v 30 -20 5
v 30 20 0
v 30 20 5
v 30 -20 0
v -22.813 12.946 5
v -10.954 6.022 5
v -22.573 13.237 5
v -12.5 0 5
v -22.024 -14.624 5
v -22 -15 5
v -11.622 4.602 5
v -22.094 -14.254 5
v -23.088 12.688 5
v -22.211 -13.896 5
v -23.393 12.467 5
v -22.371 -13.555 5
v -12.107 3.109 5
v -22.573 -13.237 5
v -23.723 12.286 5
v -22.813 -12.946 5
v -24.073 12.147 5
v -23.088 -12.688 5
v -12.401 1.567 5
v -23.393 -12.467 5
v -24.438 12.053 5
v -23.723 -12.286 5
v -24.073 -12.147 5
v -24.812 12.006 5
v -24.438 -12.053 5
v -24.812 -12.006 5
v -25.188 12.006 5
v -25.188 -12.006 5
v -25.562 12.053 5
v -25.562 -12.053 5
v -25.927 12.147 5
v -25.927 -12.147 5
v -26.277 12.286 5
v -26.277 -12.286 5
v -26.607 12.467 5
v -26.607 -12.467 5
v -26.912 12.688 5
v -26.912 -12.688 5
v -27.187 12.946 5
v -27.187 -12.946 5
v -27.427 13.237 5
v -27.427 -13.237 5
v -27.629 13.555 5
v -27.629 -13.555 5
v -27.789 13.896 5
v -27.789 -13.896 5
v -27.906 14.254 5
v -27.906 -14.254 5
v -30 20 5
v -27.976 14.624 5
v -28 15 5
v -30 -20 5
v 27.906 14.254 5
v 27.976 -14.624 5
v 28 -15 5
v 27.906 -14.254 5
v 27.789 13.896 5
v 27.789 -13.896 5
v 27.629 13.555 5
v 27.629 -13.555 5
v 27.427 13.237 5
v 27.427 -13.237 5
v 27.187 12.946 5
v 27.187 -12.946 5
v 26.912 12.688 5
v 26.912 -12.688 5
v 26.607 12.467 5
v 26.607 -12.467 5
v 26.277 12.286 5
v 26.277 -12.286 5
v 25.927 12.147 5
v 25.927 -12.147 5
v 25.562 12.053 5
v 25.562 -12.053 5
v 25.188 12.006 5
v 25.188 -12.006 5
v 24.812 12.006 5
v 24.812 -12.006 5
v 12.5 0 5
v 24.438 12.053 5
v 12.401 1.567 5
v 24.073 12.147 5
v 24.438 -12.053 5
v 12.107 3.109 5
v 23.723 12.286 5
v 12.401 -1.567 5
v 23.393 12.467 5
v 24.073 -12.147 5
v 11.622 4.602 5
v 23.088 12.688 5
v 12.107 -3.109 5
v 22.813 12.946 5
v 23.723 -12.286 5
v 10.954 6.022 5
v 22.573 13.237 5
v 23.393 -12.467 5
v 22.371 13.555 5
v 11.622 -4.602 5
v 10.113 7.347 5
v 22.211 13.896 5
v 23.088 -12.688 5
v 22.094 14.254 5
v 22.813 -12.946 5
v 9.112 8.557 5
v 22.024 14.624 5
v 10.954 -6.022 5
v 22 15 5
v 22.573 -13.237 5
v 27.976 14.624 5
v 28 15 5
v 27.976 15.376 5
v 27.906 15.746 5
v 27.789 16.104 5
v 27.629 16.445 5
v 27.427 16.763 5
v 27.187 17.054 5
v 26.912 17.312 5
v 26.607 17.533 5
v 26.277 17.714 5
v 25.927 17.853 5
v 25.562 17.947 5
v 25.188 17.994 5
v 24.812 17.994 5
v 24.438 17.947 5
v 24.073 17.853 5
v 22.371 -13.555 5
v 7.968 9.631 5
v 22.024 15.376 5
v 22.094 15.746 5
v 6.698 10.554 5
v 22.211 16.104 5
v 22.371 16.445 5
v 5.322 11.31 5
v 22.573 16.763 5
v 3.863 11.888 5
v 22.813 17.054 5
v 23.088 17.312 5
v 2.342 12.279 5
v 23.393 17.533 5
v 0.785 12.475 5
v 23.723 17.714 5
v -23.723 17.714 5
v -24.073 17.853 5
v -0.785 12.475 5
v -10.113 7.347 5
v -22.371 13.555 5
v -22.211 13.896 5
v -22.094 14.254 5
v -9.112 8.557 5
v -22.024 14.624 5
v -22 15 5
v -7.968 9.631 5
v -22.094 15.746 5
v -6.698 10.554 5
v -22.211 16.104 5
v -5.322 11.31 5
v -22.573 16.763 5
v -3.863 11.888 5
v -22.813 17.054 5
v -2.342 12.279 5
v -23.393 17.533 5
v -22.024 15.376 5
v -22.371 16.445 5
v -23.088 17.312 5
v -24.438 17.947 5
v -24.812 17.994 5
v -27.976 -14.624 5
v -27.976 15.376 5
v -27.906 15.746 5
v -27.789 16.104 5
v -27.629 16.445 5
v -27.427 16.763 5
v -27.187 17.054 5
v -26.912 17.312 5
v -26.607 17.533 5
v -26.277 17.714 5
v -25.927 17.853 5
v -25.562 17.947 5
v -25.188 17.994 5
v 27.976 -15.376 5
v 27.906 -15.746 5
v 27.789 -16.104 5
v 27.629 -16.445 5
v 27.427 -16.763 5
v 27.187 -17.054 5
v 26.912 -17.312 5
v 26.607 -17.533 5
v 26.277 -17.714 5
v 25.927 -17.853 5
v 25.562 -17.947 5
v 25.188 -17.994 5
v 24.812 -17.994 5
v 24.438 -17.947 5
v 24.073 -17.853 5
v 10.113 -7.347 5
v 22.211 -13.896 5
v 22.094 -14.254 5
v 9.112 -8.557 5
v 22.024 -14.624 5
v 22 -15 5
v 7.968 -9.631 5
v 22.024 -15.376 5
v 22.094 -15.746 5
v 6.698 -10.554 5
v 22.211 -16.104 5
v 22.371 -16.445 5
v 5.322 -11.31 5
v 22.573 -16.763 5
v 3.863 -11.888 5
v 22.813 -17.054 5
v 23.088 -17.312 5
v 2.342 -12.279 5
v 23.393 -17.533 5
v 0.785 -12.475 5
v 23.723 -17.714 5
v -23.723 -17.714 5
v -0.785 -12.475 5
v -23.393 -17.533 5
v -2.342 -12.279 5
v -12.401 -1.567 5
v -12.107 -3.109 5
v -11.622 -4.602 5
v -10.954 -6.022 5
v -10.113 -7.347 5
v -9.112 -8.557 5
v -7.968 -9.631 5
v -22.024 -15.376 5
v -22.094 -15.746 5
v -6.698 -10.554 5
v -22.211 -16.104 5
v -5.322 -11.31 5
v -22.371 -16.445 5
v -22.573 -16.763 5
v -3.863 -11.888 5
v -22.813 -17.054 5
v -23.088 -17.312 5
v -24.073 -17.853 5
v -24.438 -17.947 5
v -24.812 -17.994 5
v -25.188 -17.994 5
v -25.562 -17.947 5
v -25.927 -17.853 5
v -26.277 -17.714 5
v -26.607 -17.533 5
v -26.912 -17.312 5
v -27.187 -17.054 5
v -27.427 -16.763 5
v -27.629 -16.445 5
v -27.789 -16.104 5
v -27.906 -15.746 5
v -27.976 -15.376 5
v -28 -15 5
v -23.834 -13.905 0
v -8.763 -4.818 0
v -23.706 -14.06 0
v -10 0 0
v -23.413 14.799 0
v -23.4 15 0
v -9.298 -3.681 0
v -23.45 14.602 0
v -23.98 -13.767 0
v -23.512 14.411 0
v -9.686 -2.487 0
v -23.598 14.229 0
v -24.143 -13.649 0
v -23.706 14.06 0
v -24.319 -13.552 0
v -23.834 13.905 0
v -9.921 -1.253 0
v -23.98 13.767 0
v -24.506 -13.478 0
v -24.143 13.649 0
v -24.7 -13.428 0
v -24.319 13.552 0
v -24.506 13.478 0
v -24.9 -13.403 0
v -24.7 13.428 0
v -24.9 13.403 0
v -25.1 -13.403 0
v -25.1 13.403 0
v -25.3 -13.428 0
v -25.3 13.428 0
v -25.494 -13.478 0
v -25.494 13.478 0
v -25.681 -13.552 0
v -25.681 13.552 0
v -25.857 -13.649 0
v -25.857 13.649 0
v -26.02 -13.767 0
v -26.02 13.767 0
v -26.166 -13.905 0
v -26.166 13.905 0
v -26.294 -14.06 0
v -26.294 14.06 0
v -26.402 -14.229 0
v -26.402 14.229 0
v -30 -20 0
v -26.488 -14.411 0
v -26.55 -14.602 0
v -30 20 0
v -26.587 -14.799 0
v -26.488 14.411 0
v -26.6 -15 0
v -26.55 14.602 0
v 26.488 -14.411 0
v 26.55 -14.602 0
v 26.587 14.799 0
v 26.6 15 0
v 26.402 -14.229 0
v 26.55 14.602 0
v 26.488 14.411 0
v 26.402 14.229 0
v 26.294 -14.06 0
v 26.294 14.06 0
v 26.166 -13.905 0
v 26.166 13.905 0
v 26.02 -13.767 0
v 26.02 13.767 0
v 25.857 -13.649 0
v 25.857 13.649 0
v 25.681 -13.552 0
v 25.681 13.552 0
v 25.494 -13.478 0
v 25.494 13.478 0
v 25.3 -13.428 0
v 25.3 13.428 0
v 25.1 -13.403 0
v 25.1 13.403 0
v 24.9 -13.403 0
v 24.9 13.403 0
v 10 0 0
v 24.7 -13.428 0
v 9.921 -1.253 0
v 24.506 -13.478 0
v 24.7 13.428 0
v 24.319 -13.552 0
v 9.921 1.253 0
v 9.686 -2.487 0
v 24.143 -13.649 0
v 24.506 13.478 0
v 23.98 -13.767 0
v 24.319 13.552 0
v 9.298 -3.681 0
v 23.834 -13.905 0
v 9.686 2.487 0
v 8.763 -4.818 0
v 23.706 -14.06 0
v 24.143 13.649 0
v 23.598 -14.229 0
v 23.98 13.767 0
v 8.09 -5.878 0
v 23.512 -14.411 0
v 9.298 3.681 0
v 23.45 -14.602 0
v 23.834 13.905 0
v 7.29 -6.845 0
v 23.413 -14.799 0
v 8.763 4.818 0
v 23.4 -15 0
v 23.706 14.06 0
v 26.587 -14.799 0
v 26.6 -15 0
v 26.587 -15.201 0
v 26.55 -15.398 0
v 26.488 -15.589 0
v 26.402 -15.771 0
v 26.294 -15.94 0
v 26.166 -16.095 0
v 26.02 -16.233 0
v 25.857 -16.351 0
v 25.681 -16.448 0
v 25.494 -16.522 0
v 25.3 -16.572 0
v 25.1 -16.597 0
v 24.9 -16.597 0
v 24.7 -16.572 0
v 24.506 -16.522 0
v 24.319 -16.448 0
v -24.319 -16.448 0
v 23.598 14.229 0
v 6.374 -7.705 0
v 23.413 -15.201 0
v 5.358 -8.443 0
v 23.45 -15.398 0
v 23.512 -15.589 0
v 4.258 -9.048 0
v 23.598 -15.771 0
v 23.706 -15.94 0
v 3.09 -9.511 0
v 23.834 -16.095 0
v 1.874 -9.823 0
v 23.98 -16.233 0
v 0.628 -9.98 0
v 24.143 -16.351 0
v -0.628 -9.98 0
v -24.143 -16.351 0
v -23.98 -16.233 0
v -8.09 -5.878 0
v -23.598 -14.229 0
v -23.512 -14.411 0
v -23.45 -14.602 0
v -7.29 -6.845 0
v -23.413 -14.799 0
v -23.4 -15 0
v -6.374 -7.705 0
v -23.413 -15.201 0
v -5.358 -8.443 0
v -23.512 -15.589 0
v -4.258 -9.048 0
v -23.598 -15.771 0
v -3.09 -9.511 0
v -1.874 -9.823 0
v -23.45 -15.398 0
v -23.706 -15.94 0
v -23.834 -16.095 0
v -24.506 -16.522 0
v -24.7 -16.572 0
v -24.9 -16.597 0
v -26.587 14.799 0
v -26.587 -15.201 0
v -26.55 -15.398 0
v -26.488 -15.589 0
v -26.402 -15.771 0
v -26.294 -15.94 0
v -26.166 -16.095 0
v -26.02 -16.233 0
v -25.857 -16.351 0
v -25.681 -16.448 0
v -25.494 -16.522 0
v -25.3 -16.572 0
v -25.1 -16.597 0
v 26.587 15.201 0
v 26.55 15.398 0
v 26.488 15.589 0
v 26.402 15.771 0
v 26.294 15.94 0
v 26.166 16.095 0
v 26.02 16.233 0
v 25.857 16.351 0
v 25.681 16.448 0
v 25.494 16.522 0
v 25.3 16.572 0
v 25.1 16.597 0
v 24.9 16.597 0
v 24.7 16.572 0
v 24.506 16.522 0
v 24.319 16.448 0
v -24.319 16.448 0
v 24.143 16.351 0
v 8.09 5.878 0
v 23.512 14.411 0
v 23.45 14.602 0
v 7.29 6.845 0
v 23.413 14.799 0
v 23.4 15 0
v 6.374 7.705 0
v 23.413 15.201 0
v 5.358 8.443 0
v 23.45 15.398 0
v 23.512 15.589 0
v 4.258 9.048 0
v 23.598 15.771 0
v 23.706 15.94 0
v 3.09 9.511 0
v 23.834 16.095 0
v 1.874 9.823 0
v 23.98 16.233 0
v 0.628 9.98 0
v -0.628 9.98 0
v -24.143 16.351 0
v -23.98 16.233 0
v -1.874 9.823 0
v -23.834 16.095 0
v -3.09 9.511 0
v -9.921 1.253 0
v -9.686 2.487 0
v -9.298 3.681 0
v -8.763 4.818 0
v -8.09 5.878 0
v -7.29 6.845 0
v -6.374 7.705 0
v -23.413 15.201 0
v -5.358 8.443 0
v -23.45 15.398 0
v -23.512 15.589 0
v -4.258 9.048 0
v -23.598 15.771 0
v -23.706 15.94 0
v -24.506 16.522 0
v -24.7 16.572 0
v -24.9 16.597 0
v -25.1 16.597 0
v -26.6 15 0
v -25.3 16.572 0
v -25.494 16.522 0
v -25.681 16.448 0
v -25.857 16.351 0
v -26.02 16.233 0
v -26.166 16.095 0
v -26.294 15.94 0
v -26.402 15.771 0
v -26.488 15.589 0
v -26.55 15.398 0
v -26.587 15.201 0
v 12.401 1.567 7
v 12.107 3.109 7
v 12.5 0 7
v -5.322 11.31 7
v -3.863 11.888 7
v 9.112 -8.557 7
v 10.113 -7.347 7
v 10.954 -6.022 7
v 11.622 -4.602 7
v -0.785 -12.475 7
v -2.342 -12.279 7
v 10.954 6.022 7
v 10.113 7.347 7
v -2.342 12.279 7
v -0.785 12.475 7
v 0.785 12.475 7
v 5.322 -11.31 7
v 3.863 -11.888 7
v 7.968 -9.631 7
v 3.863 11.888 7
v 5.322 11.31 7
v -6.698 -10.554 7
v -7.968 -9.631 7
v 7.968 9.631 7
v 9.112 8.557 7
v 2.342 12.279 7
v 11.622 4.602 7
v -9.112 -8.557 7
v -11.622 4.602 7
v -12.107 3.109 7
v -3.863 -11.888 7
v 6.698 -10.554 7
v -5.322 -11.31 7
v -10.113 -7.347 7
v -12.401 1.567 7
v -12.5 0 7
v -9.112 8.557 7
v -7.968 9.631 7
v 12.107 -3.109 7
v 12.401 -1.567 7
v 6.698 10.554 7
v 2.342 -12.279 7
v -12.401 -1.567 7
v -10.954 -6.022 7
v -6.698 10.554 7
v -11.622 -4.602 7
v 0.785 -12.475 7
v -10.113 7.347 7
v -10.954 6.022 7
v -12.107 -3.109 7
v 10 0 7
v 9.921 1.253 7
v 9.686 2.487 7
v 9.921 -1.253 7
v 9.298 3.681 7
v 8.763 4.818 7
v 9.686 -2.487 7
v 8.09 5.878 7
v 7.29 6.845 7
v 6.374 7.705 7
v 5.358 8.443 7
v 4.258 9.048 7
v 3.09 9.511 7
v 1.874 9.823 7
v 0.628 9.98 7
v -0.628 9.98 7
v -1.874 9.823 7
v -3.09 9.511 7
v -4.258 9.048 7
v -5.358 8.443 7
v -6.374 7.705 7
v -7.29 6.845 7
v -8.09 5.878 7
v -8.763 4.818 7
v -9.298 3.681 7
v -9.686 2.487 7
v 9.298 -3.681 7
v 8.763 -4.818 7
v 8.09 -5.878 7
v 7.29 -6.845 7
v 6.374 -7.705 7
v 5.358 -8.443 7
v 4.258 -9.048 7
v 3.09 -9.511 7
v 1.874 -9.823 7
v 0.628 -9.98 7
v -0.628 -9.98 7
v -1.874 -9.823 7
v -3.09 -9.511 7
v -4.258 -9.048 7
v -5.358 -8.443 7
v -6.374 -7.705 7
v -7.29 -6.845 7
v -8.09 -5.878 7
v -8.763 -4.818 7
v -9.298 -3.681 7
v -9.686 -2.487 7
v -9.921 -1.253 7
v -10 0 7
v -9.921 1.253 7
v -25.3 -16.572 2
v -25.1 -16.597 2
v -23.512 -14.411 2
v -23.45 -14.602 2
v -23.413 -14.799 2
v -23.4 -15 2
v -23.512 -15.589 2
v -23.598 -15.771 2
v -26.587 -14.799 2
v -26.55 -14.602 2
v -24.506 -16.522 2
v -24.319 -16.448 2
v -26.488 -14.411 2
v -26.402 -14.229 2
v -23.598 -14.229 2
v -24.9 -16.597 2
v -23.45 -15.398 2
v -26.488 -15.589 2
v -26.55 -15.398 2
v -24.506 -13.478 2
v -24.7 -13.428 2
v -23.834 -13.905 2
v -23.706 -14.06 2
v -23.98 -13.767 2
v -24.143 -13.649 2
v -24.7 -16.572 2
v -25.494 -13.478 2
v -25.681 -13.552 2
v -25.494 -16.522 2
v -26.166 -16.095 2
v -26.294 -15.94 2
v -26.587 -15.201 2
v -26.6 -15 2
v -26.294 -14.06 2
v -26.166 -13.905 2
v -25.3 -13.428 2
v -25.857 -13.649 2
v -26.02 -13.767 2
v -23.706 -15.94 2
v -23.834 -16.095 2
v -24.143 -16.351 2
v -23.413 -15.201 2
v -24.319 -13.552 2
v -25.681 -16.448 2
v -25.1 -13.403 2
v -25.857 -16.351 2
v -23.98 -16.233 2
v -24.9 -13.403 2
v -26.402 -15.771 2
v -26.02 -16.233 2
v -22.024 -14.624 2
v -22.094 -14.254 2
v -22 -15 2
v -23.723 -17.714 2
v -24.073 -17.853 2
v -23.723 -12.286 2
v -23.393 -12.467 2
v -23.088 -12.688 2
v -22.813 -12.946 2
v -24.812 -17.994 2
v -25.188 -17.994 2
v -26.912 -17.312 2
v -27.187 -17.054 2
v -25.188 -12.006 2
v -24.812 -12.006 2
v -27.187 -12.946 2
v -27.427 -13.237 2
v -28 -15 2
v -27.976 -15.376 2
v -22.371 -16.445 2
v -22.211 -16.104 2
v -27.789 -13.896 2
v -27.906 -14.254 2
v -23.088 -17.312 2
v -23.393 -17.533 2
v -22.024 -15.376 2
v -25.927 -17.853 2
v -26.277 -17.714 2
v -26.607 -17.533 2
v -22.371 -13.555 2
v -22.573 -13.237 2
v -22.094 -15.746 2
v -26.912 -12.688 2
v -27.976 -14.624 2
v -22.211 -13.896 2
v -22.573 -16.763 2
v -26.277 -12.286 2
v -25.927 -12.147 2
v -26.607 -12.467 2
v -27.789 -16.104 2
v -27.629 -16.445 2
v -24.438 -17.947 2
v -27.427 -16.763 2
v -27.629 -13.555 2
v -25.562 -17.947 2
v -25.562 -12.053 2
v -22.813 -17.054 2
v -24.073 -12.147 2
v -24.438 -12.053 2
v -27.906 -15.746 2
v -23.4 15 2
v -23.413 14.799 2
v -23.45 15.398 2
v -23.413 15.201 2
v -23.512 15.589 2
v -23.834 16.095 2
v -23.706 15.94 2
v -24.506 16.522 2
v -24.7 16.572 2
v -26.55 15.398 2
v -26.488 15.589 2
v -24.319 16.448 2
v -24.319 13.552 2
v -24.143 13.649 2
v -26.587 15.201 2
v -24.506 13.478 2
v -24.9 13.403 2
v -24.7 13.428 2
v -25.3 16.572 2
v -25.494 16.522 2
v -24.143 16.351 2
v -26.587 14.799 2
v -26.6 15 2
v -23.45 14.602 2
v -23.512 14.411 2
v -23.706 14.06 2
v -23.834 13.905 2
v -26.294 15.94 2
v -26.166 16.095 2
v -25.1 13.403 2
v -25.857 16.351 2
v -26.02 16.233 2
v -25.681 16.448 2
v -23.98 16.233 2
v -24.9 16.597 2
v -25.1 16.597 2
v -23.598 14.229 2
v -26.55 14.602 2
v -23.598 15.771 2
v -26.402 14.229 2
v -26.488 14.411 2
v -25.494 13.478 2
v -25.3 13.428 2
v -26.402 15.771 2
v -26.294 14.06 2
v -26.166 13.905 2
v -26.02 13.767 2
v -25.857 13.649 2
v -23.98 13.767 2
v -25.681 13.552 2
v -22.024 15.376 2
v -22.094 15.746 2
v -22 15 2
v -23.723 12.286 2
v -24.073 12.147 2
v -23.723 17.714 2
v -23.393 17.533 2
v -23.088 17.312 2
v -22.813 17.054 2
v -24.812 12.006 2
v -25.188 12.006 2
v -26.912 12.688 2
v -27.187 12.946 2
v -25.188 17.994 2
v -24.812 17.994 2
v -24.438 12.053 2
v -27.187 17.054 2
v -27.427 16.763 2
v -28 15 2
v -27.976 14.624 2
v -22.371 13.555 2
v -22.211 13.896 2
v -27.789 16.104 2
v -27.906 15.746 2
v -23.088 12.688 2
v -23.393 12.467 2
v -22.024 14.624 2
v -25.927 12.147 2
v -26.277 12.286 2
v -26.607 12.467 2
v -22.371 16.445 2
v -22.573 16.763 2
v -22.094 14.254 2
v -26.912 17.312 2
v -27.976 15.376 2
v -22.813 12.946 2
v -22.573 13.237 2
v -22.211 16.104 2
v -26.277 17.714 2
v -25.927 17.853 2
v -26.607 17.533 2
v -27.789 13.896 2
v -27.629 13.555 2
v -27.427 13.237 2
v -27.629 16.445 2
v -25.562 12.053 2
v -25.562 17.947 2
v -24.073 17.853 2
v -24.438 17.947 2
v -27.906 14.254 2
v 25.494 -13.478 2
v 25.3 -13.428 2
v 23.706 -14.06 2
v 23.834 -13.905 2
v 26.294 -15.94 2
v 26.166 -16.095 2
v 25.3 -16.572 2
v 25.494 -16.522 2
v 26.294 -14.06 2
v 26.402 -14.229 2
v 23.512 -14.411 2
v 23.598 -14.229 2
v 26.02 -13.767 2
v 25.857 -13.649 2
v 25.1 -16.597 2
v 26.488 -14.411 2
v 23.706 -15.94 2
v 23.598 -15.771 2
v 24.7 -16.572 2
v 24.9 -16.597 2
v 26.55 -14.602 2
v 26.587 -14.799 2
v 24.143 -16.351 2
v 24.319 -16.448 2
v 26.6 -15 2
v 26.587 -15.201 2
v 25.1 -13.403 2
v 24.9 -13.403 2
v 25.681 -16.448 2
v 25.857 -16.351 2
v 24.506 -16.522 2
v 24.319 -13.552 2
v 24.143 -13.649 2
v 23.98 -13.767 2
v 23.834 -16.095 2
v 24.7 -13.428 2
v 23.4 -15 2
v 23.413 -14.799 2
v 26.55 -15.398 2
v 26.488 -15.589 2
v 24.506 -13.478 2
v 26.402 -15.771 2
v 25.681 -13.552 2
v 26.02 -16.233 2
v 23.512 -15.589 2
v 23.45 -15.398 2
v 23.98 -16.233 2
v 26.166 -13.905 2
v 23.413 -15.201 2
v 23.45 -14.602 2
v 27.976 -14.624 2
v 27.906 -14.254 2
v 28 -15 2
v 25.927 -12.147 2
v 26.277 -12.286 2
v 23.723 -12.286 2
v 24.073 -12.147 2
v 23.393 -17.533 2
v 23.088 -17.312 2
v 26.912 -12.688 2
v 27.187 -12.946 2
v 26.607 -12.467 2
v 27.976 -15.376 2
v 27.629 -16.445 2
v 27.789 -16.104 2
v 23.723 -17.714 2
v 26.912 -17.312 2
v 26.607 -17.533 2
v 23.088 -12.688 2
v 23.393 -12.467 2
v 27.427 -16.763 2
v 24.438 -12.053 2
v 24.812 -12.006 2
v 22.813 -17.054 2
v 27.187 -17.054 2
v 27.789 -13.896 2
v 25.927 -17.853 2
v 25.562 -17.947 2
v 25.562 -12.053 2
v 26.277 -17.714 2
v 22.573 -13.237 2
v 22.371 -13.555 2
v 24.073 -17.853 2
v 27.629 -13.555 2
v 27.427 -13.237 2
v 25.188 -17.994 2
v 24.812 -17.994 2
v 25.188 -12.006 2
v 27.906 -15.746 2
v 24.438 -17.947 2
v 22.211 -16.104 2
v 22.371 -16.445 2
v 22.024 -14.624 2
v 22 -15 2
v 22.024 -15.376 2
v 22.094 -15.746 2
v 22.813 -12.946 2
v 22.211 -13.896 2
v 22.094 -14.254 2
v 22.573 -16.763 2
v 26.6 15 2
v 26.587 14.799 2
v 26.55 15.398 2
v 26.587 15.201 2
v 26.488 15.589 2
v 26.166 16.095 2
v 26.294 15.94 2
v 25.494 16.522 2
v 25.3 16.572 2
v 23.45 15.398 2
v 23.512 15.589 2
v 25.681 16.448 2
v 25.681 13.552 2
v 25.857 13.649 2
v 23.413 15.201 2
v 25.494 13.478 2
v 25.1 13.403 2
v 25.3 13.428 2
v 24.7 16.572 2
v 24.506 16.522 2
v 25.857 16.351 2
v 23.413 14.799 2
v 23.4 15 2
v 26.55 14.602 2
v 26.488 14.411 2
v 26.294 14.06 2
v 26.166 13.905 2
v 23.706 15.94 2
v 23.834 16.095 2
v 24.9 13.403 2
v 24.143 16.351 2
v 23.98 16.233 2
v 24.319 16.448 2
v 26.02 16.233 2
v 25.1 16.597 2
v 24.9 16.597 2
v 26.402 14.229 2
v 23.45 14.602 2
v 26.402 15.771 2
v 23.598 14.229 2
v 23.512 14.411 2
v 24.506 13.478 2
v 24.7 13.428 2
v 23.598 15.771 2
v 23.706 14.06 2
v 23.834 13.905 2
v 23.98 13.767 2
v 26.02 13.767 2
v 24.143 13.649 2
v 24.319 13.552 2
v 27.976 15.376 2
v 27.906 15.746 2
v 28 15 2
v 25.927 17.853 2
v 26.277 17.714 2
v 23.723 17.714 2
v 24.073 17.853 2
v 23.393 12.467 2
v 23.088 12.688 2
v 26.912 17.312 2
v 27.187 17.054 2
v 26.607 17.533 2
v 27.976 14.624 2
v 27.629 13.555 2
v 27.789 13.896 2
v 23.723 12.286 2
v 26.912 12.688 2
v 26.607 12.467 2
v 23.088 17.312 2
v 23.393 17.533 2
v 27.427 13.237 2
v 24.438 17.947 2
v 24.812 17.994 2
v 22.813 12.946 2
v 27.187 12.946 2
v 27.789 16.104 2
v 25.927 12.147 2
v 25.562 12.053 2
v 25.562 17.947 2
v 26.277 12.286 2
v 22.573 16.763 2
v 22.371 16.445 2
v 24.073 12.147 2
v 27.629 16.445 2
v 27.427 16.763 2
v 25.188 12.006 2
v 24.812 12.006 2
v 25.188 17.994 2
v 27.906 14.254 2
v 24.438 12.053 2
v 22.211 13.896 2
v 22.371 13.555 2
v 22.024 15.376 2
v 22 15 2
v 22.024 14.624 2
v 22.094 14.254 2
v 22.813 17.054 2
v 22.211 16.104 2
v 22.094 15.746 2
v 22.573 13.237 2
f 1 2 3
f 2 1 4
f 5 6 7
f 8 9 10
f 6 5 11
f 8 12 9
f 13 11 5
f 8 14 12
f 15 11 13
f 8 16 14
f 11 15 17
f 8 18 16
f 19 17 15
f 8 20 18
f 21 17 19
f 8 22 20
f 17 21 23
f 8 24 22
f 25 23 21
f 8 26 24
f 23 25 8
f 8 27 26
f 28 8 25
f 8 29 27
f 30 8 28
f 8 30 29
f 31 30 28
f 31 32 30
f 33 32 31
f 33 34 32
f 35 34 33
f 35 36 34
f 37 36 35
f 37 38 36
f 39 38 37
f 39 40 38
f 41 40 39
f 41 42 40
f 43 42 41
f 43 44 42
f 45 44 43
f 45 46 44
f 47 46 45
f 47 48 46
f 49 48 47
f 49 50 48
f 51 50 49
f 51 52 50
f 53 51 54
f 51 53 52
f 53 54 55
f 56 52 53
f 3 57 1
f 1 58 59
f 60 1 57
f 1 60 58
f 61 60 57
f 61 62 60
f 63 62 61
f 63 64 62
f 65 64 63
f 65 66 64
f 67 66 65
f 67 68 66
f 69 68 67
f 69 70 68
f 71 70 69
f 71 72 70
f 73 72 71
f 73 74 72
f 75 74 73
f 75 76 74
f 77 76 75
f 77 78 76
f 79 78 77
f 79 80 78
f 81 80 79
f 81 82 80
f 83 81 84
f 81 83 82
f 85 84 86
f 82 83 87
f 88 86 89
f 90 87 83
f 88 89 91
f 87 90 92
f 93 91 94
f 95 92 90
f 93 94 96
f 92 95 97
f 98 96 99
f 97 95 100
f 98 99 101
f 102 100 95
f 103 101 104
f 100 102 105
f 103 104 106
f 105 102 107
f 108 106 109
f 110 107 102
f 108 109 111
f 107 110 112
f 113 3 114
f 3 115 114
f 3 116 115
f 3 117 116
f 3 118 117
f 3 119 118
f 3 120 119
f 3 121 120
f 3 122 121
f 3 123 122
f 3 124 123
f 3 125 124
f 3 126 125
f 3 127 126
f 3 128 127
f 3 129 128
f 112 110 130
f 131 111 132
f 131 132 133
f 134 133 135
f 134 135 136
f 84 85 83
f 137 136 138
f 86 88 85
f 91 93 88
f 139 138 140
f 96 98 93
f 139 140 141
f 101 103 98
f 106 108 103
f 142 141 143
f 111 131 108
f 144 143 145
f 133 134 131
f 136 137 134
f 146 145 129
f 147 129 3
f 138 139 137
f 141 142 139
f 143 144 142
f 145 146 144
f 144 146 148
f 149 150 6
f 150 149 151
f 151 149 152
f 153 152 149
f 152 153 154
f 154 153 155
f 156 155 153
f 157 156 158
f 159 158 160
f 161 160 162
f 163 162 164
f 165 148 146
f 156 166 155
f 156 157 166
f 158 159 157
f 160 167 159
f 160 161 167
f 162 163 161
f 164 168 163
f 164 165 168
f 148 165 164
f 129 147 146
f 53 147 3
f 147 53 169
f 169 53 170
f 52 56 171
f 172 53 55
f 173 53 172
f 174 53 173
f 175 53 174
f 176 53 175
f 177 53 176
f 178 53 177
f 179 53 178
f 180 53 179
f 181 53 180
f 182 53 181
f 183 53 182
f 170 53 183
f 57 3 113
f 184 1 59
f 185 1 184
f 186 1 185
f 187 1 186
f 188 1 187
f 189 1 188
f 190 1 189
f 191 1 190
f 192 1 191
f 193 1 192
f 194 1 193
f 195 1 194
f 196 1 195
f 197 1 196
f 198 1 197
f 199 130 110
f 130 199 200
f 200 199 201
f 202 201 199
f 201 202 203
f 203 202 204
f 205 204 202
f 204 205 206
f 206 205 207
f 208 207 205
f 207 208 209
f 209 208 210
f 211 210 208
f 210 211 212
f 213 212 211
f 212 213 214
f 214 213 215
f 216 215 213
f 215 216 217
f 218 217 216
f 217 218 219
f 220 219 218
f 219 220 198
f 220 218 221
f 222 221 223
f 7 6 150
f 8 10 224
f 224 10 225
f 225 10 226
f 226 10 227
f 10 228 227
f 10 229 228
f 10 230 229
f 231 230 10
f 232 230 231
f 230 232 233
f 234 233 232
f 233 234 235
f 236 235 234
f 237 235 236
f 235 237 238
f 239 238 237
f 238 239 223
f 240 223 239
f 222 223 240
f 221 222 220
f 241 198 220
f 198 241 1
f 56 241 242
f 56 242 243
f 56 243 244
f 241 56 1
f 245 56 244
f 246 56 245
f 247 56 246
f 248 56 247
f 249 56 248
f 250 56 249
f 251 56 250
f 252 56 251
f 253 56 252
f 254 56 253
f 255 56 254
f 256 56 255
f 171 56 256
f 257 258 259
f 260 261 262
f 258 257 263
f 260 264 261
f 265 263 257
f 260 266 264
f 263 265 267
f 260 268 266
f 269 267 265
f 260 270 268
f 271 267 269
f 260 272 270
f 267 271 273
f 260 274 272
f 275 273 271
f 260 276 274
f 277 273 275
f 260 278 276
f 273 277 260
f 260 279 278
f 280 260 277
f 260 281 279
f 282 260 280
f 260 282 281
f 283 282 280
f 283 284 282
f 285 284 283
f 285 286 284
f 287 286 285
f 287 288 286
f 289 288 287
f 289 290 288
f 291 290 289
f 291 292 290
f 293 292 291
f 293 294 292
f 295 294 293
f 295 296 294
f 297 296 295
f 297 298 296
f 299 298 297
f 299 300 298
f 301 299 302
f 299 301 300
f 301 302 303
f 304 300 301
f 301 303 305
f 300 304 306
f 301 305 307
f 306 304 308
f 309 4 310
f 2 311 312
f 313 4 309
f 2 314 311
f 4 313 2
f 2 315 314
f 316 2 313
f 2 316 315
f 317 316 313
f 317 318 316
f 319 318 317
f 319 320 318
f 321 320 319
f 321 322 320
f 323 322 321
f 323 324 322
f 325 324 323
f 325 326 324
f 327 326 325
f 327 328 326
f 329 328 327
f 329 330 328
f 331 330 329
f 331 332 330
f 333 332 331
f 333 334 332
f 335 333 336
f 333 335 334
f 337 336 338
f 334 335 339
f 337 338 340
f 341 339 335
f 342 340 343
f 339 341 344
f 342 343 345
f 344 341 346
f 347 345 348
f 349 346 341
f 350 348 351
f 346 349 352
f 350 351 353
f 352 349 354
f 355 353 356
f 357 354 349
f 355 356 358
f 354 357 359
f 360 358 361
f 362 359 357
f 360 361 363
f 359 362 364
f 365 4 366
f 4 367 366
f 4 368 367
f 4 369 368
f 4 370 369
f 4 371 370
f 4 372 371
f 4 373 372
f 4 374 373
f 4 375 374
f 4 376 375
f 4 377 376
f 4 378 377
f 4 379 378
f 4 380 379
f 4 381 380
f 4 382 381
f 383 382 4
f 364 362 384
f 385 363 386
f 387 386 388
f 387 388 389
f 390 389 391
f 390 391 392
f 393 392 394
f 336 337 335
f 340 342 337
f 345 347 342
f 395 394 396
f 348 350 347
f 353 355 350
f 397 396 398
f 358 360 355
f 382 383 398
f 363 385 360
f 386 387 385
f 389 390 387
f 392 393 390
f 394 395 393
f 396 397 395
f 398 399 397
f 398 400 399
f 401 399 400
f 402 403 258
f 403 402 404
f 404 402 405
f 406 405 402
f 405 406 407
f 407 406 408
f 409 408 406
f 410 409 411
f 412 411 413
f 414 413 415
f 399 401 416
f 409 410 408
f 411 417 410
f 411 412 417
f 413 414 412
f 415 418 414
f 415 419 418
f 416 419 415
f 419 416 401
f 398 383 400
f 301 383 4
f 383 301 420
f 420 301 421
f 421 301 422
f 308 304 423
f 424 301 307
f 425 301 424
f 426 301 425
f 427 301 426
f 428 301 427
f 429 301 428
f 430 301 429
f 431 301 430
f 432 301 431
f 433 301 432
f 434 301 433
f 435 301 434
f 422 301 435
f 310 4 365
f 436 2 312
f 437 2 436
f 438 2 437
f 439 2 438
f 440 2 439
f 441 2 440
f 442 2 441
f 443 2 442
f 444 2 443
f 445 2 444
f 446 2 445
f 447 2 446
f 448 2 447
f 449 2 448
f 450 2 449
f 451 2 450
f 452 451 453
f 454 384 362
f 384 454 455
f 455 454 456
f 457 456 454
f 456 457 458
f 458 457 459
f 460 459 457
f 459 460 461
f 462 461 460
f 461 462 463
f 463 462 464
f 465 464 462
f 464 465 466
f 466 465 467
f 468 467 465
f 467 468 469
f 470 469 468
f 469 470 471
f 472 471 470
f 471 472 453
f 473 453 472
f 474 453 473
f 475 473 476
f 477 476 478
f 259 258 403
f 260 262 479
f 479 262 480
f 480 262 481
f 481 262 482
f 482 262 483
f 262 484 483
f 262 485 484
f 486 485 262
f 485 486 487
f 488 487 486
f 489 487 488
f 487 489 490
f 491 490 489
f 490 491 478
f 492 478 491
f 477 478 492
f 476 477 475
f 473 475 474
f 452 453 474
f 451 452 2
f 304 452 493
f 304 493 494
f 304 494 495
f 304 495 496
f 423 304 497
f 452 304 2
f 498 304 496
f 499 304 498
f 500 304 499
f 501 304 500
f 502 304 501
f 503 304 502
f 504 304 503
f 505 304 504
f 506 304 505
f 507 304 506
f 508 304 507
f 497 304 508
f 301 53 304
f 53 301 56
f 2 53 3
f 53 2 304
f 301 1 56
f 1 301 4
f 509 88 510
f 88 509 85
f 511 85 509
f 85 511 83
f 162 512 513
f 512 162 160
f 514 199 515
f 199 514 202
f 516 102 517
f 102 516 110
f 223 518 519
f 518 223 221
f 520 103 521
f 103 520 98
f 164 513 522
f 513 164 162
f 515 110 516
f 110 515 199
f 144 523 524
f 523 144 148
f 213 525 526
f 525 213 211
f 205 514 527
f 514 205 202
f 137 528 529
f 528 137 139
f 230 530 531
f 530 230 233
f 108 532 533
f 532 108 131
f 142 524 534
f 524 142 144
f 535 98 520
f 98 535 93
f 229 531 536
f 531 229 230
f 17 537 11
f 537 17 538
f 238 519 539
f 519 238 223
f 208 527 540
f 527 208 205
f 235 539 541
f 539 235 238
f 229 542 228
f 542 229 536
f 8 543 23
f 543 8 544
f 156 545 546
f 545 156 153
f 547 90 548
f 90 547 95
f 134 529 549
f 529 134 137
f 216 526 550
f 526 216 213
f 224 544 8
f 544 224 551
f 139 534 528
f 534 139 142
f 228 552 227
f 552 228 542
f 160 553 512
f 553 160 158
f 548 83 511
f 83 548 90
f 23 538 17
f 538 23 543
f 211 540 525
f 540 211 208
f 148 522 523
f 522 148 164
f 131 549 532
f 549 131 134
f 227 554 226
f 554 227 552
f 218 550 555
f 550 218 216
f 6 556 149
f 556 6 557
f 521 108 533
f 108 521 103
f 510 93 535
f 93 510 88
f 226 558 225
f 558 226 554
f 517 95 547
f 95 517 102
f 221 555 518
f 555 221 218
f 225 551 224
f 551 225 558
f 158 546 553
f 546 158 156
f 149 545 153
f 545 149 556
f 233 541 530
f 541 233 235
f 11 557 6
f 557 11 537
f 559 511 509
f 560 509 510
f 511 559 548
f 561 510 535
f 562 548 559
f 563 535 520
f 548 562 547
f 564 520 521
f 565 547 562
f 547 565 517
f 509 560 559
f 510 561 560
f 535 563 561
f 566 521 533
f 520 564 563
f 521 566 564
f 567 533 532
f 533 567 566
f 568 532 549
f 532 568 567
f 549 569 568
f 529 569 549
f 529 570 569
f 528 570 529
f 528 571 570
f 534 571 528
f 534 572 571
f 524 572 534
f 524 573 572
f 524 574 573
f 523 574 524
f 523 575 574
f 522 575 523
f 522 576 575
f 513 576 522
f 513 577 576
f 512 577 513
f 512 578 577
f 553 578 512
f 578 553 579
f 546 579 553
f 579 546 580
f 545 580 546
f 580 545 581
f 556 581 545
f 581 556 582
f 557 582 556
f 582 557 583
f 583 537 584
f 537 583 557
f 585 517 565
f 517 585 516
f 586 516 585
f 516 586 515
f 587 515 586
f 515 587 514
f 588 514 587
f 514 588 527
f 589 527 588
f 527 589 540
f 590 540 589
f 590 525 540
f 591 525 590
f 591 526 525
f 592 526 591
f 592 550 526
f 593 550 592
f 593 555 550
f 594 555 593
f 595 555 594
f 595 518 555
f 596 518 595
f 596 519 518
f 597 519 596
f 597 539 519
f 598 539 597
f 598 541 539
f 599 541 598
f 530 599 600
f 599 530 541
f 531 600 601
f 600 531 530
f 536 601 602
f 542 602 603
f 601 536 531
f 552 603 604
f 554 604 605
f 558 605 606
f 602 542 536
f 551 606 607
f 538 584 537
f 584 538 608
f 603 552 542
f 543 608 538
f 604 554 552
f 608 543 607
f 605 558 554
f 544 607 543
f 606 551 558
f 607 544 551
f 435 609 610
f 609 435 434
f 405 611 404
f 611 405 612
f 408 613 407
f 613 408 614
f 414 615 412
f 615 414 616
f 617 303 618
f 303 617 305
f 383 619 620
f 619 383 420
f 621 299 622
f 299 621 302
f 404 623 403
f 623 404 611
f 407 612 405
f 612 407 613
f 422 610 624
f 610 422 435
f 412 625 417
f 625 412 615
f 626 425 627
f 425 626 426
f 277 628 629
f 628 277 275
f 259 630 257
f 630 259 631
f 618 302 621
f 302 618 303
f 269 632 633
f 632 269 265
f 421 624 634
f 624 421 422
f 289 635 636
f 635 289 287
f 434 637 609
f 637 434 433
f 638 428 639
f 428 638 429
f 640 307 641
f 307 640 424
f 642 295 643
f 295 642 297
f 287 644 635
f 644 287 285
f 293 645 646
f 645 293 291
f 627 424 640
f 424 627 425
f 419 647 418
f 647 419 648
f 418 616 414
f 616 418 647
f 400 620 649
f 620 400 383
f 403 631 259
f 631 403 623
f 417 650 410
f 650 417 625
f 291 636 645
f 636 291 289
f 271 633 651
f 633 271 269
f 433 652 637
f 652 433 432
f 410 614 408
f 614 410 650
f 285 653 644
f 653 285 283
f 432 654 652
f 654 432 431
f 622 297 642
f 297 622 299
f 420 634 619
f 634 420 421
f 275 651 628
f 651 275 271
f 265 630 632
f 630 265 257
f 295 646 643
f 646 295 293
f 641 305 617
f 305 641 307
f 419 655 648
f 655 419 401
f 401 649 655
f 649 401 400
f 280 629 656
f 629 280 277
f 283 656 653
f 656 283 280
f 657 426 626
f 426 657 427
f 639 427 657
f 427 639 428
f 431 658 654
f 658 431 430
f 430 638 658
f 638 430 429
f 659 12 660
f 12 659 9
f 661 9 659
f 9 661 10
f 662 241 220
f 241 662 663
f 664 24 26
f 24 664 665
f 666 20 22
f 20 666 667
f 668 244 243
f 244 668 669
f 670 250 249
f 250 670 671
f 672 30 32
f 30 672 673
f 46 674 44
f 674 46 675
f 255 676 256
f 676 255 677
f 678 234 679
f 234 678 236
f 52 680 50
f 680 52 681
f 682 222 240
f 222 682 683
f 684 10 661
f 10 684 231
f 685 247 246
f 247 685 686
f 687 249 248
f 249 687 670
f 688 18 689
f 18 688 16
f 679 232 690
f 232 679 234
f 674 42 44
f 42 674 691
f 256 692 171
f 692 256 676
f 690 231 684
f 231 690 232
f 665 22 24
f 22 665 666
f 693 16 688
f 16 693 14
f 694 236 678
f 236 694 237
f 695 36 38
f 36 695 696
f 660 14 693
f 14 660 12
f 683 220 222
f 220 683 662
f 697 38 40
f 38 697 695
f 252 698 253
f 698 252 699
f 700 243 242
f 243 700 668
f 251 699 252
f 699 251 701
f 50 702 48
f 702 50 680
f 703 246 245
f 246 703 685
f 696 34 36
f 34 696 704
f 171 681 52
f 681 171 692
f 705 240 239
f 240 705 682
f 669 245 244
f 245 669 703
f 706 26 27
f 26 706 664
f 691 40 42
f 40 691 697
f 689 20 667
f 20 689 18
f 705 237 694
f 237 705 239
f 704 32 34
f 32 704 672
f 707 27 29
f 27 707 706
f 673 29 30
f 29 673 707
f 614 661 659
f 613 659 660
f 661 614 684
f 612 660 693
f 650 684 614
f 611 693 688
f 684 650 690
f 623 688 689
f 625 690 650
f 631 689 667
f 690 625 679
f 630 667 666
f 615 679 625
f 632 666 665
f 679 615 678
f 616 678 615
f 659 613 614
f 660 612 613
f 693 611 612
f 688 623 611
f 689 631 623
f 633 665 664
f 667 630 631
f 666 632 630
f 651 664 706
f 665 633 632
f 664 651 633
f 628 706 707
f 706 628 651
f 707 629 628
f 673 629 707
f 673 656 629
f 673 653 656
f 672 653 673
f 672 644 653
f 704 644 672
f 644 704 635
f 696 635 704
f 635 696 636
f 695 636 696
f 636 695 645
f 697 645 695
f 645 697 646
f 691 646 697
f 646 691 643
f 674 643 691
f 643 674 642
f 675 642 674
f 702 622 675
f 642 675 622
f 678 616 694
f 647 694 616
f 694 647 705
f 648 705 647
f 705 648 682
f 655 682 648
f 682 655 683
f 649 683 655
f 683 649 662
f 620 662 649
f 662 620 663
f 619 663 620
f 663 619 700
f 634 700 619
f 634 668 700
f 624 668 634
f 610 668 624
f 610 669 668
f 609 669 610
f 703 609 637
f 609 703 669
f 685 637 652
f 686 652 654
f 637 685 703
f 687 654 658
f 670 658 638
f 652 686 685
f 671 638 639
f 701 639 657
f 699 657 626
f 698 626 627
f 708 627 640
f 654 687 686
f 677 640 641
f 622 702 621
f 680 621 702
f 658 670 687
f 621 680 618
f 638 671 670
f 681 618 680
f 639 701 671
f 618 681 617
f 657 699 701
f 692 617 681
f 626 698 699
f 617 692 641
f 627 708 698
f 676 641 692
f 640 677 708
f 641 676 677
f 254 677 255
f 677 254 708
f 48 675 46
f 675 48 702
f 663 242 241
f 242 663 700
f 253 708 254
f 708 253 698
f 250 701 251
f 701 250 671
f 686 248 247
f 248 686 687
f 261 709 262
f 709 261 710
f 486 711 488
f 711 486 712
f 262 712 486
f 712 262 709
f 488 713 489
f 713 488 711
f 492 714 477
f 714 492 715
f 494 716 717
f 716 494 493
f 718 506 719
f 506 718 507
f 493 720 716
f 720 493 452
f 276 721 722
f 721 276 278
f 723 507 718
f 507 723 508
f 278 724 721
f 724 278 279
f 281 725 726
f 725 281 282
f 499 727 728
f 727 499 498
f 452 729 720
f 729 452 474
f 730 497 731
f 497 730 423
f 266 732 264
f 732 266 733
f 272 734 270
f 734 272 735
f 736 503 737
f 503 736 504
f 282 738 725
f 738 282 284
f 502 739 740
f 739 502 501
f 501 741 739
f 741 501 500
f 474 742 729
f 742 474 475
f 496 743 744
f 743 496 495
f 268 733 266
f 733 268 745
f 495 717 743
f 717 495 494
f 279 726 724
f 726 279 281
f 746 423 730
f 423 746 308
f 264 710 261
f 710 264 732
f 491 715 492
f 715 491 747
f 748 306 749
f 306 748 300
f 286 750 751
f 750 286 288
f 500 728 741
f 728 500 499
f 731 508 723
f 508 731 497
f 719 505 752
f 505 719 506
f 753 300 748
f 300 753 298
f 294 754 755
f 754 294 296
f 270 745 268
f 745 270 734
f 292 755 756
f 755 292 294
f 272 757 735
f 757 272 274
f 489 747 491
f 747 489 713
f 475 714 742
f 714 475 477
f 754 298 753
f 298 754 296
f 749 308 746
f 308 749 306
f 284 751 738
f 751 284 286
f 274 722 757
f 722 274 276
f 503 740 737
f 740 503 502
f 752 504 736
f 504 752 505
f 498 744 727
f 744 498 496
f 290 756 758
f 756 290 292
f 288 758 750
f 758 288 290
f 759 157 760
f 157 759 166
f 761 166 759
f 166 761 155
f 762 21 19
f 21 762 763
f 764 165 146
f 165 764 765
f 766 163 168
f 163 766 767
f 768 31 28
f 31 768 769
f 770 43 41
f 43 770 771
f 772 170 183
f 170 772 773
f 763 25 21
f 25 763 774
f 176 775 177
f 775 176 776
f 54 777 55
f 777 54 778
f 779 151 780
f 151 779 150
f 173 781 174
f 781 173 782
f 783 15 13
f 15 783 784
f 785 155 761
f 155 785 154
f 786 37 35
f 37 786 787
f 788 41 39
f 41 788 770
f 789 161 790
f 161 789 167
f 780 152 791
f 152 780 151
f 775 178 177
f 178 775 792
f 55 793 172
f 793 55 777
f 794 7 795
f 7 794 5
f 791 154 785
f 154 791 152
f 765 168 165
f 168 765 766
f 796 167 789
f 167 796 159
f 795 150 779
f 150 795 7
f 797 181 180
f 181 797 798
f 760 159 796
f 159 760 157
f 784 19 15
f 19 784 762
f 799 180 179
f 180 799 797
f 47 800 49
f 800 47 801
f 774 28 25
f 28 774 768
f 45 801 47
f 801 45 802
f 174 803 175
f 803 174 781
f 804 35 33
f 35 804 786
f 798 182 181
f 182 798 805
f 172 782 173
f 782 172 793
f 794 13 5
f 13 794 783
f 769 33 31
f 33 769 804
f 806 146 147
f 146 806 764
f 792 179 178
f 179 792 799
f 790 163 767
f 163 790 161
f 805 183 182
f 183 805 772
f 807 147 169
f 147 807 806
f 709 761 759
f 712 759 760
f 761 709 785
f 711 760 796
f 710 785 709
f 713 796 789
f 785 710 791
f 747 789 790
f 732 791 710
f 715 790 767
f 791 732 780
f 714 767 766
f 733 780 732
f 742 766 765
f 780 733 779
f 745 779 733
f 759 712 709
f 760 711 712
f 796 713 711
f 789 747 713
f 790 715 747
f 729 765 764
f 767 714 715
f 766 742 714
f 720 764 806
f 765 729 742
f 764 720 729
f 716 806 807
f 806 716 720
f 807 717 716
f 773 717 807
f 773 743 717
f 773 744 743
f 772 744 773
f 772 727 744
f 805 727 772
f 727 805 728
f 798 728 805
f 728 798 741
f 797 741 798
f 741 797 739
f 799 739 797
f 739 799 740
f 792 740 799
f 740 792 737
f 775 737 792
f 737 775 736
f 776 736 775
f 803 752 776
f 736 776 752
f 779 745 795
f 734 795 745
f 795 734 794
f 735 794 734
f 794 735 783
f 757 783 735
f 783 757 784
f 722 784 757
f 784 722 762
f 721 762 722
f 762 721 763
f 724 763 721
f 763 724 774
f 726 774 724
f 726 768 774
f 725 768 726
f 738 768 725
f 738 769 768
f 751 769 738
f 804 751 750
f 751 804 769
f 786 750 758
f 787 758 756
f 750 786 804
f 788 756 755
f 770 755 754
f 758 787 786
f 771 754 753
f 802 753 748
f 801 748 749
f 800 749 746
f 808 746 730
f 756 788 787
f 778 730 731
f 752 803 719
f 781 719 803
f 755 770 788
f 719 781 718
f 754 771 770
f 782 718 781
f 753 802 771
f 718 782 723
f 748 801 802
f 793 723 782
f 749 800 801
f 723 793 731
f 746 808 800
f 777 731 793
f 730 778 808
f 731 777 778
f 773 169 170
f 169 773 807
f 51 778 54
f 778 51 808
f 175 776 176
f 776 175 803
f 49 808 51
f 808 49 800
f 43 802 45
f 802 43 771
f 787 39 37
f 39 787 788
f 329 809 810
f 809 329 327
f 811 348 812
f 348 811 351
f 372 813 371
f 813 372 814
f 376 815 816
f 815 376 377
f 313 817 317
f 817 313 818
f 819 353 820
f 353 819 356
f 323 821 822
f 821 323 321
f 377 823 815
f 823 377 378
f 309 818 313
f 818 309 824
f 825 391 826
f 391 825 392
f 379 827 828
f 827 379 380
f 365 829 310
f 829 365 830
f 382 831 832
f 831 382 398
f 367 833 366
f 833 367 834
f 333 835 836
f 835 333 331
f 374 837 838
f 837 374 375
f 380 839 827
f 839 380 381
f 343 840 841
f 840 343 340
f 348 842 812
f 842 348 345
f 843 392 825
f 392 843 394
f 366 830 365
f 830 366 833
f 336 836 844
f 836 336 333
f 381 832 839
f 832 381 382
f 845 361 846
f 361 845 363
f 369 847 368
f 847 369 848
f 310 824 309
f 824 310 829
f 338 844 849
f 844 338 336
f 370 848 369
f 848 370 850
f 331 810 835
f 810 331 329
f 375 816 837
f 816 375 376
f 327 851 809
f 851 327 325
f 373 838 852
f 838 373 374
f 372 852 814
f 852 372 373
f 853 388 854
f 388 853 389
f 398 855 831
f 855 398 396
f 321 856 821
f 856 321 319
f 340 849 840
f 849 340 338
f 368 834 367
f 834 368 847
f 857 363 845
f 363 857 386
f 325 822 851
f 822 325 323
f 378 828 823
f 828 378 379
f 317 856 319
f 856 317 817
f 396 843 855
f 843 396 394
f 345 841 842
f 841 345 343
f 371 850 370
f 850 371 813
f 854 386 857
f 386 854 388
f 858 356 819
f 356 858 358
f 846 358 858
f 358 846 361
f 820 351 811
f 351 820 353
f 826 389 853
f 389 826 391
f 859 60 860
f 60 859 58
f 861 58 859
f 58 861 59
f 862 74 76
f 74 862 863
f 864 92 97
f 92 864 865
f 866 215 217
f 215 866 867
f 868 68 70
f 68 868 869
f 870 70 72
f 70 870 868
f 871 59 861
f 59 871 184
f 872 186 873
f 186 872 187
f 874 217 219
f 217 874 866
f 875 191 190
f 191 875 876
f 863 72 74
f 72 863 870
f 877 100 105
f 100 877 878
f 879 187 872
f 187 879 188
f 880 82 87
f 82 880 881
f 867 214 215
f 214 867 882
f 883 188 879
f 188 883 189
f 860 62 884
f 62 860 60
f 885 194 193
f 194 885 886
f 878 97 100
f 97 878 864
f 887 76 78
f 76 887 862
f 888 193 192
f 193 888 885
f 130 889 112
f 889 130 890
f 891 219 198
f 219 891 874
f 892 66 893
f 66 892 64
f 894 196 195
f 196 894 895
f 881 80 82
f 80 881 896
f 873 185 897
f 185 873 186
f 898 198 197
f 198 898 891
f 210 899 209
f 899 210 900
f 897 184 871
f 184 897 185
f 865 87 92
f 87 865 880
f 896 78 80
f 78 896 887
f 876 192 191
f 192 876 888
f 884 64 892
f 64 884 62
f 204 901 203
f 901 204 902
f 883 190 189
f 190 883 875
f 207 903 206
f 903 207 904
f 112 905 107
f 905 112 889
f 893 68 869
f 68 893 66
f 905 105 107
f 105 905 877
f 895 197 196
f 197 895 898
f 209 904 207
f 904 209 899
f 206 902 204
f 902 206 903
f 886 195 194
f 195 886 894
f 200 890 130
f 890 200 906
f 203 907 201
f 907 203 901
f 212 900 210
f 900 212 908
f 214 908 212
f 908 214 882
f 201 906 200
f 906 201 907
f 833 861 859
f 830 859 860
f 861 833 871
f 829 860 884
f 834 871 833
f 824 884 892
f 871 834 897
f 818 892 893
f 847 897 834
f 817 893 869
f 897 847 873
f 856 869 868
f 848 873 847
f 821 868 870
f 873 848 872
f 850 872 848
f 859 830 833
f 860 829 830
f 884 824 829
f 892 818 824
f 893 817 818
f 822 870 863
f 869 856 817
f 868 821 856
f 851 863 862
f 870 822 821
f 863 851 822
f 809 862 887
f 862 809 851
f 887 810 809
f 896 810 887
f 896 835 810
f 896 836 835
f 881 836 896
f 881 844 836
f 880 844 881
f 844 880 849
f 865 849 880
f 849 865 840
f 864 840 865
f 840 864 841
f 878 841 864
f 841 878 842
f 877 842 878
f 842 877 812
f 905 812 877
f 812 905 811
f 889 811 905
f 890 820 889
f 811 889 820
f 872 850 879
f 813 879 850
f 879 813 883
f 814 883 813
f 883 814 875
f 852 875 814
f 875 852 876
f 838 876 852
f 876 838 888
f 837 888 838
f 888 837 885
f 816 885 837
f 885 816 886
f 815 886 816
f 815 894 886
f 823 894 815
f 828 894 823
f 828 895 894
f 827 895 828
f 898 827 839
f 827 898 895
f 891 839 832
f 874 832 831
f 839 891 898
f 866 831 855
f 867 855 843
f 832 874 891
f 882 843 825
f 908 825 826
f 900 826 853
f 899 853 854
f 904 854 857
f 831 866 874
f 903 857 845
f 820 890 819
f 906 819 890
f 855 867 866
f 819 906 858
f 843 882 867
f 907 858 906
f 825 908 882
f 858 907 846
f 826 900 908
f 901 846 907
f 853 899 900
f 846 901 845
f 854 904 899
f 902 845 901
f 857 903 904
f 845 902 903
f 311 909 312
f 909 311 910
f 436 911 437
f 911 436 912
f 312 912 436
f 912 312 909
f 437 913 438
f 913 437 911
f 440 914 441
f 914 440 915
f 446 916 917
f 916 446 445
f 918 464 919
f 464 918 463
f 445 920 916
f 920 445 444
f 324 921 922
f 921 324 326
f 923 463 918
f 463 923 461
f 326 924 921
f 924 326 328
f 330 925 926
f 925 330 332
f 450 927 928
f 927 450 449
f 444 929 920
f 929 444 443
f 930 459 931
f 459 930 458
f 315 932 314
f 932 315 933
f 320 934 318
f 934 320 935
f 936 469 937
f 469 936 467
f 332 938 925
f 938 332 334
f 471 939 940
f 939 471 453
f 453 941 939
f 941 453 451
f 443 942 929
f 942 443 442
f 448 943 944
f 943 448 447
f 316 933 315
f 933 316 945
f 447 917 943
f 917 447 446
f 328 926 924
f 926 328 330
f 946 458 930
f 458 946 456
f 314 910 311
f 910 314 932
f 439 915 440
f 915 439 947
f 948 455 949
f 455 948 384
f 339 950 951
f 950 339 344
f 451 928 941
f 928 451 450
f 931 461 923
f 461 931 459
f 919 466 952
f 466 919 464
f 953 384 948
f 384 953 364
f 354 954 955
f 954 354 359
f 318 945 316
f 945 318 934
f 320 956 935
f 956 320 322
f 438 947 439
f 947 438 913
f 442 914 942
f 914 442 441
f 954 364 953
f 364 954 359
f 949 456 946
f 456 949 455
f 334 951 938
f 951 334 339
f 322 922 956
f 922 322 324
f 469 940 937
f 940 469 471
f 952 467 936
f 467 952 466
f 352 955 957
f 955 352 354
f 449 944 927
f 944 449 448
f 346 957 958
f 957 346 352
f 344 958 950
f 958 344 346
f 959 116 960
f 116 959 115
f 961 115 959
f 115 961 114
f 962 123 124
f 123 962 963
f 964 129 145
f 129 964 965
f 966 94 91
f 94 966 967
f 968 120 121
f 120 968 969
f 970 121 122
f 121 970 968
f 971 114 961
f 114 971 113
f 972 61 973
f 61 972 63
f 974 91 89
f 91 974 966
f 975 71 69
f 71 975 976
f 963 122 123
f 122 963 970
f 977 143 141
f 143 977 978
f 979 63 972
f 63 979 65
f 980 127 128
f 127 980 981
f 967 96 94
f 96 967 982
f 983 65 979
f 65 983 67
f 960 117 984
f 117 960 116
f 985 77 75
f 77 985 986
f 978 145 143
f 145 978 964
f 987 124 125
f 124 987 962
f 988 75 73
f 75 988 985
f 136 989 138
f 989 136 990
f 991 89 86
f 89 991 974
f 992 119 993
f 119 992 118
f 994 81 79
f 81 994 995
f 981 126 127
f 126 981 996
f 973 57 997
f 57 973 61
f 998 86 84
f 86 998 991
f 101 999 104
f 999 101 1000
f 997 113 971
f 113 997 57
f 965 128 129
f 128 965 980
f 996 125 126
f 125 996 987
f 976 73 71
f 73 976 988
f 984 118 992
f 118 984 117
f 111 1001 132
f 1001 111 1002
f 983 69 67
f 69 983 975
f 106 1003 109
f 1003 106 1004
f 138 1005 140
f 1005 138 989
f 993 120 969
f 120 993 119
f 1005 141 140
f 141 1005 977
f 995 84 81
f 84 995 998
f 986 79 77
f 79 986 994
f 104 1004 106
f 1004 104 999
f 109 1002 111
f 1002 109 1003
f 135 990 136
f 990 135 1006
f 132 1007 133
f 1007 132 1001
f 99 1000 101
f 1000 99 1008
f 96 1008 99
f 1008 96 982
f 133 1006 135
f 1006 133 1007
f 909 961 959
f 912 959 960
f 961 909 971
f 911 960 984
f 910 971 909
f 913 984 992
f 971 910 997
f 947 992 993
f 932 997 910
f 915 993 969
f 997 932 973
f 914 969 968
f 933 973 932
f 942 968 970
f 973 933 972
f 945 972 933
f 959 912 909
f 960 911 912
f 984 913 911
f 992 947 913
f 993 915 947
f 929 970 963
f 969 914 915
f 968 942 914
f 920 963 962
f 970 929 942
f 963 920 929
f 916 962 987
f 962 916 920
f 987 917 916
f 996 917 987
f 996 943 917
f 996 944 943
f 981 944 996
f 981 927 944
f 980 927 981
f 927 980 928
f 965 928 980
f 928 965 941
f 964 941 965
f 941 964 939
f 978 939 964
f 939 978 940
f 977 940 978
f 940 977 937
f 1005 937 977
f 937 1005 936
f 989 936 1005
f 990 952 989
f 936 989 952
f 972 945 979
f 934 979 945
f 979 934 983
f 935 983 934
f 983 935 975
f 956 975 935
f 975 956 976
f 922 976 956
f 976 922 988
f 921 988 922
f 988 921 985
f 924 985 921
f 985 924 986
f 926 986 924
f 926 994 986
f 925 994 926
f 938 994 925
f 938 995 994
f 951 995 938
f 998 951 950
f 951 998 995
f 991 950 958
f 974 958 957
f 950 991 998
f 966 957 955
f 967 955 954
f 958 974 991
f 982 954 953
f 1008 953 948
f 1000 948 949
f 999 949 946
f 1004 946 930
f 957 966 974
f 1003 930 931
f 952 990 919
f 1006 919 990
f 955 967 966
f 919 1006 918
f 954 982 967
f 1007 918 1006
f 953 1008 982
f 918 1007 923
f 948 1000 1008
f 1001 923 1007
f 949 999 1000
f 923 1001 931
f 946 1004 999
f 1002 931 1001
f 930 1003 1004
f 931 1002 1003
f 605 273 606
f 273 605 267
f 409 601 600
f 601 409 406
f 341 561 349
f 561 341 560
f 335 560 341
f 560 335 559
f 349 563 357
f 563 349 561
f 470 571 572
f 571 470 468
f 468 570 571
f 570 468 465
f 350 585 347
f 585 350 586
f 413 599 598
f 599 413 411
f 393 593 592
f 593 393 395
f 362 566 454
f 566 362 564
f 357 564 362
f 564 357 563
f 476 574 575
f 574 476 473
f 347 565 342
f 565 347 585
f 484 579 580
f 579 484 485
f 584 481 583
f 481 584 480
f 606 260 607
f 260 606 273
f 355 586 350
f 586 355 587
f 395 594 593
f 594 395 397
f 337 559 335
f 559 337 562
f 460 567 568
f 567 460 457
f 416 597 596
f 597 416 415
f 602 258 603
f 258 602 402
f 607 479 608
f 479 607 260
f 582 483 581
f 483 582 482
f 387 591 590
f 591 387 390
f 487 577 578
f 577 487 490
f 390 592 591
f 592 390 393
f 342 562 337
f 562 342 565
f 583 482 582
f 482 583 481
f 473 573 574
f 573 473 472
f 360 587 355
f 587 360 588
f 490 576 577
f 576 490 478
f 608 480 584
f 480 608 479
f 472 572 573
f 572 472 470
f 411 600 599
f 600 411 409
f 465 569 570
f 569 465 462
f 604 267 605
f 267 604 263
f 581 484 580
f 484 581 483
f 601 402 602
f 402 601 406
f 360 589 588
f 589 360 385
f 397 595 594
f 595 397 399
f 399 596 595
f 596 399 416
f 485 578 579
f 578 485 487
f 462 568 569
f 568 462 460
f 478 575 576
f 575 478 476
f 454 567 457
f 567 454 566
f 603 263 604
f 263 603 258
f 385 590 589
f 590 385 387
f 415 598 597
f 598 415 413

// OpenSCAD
// Motor mount plate -- first-pass attempt from prompt.
// Parametric. Plate sits with its bottom face at z=0, boss rises from top.

$fn = 50;

// --- Parameters ---
plate_w = 60;   // X extent
plate_d = 40;   // Y extent
plate_t = 5;    // plate thickness

bore_dia   = 20;
boss_dia   = 25;
boss_h     = 2;

hole_dia      = 3.2;
hole_dx       = 50;  // X spacing of mounting holes
hole_dy       = 30;  // Y spacing of mounting holes

cbore_dia     = 6;
cbore_depth   = 3;

module motor_mount() {
    difference() {
        union() {
            // base plate centered on origin in X/Y, bottom at z=0
            translate([-plate_w/2, -plate_d/2, 0])
                cube([plate_w, plate_d, plate_t]);
            // raised boss above the bore
            translate([0, 0, plate_t])
                cylinder(h = boss_h, d = boss_dia);
        }
        // motor bore -- through plate + boss
        translate([0, 0, -0.5])
            cylinder(h = plate_t + boss_h + 1, d = bore_dia);
        // four mounting holes with counterbores
        for (x = [-hole_dx/2, hole_dx/2])
            for (y = [-hole_dy/2, hole_dy/2]) {
                translate([x, y, -0.5])
                    cylinder(h = plate_t + 1, d = hole_dia);
                translate([x, y, plate_t - cbore_depth])
                    cylinder(h = cbore_depth + 0.5, d = cbore_dia);
            }
    }
}

motor_mount();
